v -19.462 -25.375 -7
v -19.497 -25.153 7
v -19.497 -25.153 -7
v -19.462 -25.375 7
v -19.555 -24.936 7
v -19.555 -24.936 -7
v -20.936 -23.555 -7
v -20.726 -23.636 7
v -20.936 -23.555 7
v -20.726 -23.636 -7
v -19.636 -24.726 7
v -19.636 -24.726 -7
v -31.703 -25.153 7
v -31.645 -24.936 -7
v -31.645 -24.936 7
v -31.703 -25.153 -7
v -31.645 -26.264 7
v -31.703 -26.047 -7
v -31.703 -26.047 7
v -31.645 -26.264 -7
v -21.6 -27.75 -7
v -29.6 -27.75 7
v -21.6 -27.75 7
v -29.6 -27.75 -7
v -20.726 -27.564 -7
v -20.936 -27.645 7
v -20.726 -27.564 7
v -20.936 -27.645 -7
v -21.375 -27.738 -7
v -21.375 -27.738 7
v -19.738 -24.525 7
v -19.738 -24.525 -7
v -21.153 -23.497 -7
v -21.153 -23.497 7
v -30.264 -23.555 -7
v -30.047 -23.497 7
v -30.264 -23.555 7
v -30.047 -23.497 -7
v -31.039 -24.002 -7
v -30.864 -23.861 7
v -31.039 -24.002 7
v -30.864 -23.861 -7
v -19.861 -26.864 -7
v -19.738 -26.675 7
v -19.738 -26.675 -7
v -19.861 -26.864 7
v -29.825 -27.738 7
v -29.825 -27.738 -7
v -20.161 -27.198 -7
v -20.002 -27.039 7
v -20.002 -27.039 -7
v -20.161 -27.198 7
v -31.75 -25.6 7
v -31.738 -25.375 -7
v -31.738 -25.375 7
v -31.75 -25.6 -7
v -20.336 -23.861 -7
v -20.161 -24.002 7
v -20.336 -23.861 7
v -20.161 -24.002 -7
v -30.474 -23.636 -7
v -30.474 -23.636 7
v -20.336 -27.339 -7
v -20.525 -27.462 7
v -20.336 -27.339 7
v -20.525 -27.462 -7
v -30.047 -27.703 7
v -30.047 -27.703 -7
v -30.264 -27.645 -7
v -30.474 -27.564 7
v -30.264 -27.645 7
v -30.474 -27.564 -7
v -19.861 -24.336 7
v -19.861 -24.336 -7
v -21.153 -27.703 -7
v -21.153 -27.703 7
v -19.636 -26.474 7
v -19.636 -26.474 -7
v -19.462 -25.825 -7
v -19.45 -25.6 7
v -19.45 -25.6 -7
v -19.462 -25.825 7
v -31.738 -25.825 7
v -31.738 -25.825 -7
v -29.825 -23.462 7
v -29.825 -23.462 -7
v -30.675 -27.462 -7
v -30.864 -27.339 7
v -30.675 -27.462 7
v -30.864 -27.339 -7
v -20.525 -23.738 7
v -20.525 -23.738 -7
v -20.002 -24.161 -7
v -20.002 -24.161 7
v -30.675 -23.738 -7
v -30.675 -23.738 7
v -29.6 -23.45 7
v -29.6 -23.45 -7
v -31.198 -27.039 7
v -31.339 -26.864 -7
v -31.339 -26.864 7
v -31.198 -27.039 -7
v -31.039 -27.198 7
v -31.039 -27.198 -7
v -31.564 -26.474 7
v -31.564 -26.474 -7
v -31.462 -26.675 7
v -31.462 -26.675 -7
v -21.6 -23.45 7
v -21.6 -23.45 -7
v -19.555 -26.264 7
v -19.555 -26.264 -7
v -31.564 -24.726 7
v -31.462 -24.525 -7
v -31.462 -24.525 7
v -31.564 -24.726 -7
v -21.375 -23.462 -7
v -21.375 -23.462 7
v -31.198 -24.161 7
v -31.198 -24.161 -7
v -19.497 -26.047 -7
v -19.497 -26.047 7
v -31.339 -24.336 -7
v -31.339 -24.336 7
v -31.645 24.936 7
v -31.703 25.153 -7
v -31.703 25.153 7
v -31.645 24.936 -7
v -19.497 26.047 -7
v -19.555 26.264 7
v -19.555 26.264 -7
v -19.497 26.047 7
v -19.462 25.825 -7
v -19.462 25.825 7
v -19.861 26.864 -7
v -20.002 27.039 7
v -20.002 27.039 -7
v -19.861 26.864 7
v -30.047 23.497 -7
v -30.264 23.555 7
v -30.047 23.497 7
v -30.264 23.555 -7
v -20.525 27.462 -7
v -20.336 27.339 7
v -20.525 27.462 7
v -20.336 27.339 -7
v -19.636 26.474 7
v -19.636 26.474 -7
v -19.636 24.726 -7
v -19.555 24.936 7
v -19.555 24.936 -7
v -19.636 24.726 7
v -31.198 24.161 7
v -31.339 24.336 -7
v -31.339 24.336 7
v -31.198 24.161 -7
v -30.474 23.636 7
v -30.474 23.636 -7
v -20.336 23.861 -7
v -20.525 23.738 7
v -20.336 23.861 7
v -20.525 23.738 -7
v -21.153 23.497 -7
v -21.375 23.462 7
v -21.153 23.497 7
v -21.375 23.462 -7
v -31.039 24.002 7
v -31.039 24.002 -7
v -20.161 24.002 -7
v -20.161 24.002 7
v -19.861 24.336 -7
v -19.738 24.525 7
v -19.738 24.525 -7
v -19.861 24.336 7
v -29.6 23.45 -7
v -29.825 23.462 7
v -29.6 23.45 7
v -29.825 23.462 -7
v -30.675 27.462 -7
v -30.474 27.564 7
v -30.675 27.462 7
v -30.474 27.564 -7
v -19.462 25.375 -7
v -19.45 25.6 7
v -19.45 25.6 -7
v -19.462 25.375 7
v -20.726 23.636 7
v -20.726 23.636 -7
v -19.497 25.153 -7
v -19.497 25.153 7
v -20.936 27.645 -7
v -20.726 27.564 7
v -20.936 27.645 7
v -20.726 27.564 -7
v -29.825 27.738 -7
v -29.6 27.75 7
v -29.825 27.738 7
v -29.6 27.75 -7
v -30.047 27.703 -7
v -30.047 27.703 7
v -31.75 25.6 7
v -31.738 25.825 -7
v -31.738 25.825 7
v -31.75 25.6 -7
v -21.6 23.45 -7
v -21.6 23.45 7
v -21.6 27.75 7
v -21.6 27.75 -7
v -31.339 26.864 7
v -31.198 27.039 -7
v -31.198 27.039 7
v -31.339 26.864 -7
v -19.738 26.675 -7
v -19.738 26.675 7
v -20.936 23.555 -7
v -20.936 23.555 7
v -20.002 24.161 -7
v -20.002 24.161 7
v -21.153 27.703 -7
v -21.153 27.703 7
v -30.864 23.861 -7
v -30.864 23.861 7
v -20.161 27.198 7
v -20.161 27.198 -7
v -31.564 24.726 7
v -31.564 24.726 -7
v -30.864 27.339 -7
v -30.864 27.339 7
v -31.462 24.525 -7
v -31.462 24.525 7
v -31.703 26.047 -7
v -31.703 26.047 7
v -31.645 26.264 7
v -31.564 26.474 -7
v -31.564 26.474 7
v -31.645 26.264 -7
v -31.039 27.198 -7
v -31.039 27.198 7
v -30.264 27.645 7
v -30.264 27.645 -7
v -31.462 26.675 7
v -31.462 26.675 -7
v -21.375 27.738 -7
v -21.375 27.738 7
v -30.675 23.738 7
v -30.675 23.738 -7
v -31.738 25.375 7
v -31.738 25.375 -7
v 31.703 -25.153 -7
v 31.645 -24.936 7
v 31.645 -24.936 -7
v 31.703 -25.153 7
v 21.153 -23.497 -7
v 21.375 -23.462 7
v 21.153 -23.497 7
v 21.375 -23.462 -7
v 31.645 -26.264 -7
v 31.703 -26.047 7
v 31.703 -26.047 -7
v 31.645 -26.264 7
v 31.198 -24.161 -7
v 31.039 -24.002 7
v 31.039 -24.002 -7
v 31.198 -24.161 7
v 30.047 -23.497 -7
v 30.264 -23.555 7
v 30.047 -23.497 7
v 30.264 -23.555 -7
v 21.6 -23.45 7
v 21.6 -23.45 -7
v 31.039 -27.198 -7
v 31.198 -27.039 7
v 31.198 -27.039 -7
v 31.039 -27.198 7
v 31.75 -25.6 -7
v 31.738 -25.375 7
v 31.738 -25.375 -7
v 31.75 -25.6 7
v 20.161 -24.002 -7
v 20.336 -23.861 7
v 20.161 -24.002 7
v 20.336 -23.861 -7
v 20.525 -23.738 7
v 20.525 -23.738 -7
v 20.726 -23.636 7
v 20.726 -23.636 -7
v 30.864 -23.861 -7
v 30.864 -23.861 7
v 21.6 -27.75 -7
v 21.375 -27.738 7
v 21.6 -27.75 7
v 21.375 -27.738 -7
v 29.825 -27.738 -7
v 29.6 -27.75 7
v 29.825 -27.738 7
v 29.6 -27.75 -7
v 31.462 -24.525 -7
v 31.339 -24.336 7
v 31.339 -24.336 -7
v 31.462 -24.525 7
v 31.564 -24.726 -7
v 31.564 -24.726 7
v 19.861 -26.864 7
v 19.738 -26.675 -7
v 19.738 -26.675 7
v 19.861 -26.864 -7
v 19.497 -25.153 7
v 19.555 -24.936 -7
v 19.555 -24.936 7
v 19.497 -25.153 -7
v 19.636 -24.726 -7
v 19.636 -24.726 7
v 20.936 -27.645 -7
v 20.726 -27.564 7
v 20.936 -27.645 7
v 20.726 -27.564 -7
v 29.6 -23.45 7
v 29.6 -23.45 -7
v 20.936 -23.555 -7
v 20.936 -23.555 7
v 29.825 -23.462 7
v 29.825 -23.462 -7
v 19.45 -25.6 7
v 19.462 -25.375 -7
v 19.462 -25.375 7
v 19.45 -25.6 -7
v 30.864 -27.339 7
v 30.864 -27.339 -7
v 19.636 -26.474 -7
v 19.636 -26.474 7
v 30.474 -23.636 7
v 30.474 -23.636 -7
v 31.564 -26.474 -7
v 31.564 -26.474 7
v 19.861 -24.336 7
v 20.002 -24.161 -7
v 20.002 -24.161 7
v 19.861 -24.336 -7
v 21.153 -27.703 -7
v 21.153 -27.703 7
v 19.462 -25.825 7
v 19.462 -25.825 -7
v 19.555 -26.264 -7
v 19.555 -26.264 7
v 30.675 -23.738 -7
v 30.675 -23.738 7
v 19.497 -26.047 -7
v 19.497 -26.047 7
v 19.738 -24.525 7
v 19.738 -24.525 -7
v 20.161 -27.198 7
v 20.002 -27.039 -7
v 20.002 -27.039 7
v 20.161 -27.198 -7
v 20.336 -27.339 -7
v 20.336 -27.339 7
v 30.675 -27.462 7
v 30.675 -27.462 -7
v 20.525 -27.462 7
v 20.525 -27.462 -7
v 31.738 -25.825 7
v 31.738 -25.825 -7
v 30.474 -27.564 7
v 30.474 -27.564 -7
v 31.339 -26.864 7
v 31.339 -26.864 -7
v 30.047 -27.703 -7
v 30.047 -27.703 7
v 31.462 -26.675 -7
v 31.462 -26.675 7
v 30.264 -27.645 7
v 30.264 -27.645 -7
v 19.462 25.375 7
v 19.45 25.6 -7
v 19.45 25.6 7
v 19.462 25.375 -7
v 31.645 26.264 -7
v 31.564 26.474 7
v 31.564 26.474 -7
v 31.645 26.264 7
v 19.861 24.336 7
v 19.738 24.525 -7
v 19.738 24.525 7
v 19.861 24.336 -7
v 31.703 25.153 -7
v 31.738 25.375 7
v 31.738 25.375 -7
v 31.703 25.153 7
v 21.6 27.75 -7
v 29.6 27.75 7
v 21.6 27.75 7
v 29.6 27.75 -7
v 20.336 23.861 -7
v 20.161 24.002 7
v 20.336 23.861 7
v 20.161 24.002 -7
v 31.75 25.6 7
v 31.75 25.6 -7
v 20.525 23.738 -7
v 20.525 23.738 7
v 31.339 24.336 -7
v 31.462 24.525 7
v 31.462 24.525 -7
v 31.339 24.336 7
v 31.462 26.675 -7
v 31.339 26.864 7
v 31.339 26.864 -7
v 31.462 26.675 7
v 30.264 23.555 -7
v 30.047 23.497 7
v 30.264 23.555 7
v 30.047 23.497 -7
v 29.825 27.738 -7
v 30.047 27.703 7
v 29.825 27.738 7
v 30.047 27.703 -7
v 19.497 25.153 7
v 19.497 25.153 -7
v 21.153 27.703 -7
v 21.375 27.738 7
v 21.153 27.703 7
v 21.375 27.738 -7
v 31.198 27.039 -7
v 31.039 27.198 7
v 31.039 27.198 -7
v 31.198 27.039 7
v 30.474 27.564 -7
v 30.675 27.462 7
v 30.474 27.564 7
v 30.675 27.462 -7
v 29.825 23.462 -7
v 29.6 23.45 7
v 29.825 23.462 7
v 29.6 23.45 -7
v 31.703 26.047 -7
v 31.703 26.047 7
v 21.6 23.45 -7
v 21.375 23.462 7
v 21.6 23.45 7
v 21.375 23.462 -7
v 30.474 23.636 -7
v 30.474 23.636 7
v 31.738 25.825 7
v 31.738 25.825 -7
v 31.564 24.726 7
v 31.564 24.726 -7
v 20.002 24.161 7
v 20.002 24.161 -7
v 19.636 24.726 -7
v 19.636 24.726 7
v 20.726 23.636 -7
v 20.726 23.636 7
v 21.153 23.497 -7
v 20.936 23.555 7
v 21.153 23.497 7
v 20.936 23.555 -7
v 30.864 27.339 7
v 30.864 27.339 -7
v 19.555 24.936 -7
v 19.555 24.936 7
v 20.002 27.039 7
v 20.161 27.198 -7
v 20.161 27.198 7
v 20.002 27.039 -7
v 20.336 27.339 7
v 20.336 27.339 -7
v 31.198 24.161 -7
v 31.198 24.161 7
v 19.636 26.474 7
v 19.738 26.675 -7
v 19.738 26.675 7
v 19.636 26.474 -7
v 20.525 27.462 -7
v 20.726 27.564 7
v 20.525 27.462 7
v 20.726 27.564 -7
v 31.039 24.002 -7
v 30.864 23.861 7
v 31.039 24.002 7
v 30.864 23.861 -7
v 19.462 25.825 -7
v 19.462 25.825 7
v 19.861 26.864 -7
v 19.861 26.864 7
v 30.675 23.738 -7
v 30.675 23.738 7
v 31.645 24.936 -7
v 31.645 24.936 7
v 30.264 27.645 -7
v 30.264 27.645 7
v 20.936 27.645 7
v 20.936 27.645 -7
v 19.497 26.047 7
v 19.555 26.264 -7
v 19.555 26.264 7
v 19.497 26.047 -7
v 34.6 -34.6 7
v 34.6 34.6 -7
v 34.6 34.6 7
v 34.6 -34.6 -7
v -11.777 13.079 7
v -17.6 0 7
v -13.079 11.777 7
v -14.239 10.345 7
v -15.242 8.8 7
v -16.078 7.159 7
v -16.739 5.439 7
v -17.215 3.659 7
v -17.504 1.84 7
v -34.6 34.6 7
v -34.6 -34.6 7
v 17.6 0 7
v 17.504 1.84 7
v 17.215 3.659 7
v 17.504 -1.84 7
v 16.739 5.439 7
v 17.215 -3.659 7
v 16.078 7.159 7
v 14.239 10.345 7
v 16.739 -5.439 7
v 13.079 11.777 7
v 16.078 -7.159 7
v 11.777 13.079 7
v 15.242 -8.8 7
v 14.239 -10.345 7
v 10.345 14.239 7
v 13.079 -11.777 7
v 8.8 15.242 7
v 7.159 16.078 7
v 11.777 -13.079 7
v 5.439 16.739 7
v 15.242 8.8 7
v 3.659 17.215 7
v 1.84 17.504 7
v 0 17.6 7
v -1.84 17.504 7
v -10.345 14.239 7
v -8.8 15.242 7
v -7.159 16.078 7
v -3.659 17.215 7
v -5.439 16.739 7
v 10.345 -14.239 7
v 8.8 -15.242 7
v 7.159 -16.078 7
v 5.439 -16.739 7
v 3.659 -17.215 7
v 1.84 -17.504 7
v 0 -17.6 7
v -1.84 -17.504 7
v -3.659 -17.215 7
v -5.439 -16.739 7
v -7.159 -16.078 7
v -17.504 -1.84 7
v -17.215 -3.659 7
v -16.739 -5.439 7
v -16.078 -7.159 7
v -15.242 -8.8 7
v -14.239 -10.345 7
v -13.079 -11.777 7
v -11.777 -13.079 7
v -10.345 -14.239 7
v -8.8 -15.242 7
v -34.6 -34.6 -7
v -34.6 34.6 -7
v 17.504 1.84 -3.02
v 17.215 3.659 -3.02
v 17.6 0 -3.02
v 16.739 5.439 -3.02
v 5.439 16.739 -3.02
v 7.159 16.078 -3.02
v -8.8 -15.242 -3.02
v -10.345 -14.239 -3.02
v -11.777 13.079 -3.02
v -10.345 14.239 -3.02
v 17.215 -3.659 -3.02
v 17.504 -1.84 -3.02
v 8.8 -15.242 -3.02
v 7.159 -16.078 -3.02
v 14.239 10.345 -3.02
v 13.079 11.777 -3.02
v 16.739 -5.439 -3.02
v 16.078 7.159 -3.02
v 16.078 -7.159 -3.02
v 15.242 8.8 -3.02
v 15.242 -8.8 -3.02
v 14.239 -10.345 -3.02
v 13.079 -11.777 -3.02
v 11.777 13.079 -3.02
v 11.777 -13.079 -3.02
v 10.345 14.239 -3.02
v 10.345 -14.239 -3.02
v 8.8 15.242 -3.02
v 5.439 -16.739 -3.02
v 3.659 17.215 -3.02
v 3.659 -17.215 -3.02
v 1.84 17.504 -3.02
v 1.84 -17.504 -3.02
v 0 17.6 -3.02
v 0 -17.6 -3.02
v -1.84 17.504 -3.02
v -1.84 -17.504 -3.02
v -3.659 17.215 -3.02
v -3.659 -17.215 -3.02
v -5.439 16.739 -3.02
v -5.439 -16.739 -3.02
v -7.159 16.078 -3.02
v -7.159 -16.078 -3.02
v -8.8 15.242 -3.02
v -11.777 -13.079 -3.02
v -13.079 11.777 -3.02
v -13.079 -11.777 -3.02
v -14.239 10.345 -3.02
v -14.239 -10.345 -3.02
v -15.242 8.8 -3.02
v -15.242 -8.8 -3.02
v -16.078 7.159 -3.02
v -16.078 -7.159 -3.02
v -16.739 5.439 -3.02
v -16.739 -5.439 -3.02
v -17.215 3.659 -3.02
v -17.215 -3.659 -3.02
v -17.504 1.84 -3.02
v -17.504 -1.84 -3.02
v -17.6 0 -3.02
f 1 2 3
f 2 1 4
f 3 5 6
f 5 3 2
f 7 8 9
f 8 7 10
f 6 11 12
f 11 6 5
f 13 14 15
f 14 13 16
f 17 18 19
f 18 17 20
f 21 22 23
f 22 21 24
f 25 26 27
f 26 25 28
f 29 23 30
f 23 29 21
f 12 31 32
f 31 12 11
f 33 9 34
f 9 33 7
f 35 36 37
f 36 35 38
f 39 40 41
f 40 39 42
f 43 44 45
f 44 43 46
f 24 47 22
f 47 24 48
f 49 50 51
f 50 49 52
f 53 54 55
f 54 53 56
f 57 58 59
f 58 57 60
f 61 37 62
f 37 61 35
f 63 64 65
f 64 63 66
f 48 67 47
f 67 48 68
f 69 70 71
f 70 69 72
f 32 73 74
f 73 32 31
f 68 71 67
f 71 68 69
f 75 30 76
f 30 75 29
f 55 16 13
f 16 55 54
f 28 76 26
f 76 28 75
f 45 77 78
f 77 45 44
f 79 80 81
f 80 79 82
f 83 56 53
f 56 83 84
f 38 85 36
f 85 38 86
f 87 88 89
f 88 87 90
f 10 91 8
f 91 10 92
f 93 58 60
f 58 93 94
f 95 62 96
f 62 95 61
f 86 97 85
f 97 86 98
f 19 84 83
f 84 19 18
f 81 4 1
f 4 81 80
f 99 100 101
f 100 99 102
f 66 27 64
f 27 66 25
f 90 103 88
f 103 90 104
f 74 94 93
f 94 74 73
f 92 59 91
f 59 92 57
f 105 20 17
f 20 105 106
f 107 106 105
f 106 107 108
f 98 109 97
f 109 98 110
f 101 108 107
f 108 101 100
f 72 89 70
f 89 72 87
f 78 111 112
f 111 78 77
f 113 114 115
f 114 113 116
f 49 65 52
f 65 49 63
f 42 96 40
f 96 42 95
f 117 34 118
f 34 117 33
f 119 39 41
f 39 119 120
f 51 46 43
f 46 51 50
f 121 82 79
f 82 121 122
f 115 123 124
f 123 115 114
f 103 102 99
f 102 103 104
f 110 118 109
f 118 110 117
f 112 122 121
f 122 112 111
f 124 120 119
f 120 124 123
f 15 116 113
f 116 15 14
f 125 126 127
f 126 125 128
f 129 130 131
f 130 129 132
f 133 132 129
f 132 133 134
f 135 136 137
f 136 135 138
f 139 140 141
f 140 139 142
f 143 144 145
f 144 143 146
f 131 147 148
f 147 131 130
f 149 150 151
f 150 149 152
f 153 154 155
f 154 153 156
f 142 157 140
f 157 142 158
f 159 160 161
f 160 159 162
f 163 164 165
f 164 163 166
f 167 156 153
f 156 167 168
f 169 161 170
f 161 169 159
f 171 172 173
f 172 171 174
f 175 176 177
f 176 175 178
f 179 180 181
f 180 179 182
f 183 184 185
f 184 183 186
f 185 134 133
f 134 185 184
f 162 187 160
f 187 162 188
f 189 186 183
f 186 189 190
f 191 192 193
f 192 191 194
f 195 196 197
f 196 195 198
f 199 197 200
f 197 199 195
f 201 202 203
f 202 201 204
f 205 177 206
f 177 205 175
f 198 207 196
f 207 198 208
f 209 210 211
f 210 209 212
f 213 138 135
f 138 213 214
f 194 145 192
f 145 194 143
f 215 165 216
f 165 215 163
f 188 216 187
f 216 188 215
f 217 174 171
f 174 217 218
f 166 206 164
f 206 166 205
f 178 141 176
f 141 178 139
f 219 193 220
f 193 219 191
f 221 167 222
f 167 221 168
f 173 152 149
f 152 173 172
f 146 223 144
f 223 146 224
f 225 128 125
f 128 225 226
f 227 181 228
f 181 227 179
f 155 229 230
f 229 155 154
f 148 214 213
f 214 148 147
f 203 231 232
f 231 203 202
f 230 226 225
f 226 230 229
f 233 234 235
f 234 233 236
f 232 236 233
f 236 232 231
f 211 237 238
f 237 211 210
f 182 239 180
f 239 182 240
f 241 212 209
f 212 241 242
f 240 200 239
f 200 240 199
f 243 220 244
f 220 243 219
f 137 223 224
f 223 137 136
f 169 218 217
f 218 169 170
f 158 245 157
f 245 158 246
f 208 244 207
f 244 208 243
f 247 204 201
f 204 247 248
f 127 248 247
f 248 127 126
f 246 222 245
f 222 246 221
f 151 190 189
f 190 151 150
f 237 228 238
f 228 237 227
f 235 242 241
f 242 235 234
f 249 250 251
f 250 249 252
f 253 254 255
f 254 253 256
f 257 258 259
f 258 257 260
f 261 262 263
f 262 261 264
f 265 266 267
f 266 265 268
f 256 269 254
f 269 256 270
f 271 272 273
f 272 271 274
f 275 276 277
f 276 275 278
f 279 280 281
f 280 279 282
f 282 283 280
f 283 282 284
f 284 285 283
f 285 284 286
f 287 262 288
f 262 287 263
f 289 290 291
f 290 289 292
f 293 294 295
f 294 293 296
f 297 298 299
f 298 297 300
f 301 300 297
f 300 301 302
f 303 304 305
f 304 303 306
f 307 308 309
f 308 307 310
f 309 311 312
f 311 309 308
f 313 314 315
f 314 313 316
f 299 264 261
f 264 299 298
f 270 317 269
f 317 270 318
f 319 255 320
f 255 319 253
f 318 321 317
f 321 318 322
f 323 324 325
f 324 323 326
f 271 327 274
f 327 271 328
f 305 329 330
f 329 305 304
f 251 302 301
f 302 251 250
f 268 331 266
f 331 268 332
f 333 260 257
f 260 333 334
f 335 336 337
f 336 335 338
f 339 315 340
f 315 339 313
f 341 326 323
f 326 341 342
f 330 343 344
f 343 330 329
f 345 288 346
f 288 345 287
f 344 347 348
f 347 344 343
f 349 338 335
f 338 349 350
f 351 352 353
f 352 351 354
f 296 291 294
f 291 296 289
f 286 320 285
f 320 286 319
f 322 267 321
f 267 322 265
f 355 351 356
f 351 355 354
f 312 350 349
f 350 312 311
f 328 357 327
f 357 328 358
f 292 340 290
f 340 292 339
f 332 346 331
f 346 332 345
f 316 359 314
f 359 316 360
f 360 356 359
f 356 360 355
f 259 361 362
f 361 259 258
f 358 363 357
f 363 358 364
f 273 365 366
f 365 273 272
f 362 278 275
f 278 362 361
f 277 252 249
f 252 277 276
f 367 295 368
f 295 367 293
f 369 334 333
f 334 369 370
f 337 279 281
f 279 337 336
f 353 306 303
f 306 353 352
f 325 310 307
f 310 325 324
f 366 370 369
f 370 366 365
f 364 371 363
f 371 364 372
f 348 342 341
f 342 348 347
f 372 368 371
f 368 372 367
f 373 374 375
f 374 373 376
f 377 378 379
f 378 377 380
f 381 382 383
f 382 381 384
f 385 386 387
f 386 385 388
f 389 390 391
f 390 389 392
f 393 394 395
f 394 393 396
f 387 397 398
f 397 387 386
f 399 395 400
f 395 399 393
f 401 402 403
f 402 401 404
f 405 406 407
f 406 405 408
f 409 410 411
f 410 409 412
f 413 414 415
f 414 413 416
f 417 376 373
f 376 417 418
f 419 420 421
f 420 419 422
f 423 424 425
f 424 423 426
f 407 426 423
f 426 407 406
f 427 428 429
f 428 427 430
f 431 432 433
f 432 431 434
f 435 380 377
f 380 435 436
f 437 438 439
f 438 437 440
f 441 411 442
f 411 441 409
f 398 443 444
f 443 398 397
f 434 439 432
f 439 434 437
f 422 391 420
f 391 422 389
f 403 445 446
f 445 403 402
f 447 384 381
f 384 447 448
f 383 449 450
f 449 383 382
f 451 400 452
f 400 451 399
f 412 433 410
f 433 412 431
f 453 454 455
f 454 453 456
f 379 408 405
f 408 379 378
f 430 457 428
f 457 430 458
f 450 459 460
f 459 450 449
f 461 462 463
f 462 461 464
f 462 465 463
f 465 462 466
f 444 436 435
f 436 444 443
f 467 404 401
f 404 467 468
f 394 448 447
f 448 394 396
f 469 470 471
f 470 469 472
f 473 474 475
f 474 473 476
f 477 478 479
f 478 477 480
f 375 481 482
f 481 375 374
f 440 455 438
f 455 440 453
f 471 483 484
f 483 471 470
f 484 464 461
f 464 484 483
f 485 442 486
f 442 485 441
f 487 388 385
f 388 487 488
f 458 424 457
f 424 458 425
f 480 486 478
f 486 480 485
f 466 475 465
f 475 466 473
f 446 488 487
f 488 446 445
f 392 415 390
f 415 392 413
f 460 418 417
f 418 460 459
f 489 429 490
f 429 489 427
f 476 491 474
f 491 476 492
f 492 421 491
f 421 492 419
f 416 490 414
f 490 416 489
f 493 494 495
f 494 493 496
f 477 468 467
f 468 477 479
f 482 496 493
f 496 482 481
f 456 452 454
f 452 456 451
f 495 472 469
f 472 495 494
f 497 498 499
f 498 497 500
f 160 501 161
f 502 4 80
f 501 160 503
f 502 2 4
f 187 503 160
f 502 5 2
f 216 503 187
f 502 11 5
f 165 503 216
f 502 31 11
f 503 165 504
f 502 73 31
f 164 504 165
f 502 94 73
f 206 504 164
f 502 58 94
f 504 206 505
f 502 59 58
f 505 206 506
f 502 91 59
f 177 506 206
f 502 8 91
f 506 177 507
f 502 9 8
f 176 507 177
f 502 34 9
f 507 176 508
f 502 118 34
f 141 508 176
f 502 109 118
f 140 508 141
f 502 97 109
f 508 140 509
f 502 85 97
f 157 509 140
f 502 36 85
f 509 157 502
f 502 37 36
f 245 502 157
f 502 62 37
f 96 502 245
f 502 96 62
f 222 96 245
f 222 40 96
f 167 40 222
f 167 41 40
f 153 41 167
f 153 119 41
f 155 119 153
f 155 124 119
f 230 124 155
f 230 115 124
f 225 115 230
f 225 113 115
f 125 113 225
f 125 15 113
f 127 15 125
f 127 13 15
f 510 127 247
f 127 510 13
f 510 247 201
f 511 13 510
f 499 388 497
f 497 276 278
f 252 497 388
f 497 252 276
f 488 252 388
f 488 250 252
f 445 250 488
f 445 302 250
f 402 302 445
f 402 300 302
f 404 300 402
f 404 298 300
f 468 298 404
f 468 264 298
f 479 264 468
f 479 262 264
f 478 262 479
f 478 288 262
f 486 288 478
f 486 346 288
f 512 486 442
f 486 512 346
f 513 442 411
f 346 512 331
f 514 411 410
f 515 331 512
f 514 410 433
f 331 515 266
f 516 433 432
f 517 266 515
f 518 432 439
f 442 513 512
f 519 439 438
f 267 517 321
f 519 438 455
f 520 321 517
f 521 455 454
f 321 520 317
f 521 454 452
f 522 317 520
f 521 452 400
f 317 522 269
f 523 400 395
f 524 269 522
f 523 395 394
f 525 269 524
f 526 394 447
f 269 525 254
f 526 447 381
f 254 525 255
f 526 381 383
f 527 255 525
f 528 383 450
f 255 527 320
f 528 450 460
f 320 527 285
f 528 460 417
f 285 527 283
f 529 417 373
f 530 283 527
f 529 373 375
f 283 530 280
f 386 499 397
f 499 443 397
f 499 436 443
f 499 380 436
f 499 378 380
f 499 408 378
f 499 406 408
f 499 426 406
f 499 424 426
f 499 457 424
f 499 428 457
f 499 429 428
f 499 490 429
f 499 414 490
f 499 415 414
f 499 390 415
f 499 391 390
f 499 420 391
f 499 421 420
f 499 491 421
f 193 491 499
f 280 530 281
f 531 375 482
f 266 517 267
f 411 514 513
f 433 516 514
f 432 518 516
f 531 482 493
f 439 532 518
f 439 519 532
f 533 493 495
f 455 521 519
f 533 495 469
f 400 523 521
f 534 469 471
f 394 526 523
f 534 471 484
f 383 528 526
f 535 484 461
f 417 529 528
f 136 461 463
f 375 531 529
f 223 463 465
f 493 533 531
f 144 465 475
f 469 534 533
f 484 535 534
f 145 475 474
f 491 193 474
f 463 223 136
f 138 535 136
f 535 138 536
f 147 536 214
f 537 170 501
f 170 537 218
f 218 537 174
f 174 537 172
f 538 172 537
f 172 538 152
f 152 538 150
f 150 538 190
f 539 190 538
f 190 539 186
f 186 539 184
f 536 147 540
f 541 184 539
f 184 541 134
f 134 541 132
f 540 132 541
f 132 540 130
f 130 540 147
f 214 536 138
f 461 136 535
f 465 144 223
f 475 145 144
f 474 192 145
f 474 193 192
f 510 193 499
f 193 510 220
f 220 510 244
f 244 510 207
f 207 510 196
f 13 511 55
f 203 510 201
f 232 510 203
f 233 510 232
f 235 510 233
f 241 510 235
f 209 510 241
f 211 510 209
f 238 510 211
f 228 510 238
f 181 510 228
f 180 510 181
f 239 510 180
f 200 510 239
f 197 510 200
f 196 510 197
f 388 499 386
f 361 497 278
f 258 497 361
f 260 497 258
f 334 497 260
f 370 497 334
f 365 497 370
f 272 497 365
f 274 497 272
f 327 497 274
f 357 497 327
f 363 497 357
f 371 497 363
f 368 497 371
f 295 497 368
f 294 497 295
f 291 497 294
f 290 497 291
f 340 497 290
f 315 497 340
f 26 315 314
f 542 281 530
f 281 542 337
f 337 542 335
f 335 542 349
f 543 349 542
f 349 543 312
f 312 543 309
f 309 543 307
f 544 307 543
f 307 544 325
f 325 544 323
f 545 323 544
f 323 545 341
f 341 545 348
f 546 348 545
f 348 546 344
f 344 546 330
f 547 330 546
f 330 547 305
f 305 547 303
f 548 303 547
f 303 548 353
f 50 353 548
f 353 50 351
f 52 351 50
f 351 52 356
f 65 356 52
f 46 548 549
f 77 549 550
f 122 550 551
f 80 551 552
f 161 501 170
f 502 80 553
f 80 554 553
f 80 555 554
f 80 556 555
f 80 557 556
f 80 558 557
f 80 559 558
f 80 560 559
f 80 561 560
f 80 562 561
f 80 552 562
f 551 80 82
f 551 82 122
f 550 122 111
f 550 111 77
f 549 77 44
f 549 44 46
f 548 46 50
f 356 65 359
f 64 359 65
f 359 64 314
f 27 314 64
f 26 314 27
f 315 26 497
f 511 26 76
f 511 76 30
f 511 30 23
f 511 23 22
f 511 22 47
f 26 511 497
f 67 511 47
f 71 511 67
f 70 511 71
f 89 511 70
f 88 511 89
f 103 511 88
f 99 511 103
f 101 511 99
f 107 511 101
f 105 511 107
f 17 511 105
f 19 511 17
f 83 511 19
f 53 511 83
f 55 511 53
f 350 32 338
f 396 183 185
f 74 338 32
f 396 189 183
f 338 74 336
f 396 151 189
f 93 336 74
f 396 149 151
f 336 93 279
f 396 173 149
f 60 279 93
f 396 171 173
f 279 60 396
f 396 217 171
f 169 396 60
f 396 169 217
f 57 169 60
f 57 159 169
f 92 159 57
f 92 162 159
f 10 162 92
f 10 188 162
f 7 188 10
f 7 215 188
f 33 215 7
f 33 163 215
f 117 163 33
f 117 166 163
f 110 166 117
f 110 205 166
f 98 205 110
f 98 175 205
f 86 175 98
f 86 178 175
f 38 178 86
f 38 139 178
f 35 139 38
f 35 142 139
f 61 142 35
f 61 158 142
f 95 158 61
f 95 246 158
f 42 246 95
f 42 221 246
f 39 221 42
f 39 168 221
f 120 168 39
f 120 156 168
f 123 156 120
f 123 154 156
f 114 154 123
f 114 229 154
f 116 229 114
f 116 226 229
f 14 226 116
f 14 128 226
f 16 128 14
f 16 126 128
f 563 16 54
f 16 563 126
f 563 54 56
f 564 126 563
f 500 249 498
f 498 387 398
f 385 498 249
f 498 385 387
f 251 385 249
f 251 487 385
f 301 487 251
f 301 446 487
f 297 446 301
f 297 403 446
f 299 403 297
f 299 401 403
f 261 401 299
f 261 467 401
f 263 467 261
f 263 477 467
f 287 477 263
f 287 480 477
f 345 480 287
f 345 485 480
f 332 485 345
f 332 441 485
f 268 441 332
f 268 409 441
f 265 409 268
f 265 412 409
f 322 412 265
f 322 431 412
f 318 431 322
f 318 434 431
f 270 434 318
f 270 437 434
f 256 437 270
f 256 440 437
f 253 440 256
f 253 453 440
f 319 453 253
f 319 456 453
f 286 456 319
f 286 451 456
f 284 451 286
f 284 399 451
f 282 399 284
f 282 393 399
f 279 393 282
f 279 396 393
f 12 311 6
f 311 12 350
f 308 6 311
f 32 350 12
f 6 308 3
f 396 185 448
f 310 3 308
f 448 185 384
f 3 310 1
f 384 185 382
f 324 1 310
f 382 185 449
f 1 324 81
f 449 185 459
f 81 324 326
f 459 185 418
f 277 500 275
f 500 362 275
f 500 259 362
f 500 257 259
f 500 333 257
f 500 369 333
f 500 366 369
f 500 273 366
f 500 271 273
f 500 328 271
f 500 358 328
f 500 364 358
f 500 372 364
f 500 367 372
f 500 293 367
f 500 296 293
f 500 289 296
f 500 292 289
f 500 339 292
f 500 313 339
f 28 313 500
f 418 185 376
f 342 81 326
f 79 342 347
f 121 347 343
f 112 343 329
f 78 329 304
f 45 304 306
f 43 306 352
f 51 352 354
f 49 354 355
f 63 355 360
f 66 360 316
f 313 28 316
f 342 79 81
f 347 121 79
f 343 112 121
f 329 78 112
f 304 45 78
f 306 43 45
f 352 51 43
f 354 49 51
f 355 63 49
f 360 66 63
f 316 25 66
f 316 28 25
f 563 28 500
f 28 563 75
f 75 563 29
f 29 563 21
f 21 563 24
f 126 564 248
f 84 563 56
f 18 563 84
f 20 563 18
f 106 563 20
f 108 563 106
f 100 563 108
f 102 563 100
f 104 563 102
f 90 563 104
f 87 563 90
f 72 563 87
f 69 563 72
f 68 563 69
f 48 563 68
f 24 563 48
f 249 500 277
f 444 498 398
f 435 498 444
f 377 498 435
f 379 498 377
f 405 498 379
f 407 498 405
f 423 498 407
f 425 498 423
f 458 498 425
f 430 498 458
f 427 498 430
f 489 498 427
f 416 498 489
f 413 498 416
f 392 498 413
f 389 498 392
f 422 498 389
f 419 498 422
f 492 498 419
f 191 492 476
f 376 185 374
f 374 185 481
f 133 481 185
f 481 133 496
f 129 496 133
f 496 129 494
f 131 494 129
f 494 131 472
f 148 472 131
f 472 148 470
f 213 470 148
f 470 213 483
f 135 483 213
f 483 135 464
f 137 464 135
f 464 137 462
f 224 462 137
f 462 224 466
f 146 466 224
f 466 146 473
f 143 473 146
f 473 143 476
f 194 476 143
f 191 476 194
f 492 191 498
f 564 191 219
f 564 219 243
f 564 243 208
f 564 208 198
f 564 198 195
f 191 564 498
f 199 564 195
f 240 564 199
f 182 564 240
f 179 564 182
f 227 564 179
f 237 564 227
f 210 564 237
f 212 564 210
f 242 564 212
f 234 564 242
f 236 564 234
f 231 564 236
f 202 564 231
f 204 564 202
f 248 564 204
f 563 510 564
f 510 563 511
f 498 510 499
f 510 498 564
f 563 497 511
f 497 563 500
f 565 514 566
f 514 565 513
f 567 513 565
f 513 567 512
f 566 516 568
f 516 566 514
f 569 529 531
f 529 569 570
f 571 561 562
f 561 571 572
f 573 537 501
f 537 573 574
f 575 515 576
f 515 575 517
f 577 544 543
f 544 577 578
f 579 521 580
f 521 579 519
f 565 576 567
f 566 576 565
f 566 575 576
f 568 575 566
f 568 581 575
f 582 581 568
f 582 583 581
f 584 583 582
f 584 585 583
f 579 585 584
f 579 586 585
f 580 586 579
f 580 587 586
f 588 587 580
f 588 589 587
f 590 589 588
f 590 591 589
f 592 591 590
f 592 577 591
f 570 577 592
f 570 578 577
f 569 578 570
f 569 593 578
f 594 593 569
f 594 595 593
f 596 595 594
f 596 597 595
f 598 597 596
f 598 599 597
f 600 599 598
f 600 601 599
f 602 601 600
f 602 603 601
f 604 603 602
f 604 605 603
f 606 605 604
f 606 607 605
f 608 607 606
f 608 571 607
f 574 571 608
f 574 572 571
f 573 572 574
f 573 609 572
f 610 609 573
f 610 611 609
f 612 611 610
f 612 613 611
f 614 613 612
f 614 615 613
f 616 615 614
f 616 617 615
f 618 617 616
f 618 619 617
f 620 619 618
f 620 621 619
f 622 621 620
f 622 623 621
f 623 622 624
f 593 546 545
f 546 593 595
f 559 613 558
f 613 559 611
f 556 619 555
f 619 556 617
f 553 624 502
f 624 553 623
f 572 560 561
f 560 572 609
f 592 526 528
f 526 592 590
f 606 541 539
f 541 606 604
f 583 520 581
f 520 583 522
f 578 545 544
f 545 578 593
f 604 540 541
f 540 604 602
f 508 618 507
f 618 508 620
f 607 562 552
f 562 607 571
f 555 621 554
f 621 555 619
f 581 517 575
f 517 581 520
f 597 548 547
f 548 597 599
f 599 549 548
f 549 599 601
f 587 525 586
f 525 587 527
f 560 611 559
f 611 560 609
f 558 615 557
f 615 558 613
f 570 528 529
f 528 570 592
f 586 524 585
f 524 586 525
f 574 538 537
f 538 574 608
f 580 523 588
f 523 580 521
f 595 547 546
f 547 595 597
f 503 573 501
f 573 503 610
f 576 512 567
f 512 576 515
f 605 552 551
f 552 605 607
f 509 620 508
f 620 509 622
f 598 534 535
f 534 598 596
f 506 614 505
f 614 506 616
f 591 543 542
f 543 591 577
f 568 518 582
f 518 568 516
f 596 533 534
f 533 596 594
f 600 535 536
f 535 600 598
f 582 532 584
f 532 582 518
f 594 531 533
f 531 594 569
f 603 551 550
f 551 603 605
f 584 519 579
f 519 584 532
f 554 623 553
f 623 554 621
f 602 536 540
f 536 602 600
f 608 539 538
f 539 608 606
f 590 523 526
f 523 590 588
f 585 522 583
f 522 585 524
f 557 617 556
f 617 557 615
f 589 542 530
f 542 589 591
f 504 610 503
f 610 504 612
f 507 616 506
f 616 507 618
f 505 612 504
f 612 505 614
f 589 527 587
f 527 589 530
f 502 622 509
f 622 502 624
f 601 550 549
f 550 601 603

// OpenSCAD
// Bearing mounting plate with 35.2 mm pocket.
$fn = 60;
eps = 0.02;
plate_w = 69.2;
plate_t = 14;
bearing_d = 35.2;
pocket_d = 10;
mount_pitch = 51.2;
module slot(x, y) {
    hull() {
        translate([x - 4, y, -plate_t / 2 - eps]) cylinder(d = 4.3, h = plate_t + 2 * eps);
        translate([x + 4, y, -plate_t / 2 - eps]) cylinder(d = 4.3, h = plate_t + 2 * eps);
    }
}
difference() {
    cube([plate_w, plate_w, plate_t], center = true);
    translate([0, 0, plate_t / 2 - pocket_d - eps]) cylinder(d = bearing_d, h = pocket_d + 2 * eps);
    for (x = [-mount_pitch / 2, mount_pitch / 2], y = [-mount_pitch / 2, mount_pitch / 2]) slot(x, y);
}
